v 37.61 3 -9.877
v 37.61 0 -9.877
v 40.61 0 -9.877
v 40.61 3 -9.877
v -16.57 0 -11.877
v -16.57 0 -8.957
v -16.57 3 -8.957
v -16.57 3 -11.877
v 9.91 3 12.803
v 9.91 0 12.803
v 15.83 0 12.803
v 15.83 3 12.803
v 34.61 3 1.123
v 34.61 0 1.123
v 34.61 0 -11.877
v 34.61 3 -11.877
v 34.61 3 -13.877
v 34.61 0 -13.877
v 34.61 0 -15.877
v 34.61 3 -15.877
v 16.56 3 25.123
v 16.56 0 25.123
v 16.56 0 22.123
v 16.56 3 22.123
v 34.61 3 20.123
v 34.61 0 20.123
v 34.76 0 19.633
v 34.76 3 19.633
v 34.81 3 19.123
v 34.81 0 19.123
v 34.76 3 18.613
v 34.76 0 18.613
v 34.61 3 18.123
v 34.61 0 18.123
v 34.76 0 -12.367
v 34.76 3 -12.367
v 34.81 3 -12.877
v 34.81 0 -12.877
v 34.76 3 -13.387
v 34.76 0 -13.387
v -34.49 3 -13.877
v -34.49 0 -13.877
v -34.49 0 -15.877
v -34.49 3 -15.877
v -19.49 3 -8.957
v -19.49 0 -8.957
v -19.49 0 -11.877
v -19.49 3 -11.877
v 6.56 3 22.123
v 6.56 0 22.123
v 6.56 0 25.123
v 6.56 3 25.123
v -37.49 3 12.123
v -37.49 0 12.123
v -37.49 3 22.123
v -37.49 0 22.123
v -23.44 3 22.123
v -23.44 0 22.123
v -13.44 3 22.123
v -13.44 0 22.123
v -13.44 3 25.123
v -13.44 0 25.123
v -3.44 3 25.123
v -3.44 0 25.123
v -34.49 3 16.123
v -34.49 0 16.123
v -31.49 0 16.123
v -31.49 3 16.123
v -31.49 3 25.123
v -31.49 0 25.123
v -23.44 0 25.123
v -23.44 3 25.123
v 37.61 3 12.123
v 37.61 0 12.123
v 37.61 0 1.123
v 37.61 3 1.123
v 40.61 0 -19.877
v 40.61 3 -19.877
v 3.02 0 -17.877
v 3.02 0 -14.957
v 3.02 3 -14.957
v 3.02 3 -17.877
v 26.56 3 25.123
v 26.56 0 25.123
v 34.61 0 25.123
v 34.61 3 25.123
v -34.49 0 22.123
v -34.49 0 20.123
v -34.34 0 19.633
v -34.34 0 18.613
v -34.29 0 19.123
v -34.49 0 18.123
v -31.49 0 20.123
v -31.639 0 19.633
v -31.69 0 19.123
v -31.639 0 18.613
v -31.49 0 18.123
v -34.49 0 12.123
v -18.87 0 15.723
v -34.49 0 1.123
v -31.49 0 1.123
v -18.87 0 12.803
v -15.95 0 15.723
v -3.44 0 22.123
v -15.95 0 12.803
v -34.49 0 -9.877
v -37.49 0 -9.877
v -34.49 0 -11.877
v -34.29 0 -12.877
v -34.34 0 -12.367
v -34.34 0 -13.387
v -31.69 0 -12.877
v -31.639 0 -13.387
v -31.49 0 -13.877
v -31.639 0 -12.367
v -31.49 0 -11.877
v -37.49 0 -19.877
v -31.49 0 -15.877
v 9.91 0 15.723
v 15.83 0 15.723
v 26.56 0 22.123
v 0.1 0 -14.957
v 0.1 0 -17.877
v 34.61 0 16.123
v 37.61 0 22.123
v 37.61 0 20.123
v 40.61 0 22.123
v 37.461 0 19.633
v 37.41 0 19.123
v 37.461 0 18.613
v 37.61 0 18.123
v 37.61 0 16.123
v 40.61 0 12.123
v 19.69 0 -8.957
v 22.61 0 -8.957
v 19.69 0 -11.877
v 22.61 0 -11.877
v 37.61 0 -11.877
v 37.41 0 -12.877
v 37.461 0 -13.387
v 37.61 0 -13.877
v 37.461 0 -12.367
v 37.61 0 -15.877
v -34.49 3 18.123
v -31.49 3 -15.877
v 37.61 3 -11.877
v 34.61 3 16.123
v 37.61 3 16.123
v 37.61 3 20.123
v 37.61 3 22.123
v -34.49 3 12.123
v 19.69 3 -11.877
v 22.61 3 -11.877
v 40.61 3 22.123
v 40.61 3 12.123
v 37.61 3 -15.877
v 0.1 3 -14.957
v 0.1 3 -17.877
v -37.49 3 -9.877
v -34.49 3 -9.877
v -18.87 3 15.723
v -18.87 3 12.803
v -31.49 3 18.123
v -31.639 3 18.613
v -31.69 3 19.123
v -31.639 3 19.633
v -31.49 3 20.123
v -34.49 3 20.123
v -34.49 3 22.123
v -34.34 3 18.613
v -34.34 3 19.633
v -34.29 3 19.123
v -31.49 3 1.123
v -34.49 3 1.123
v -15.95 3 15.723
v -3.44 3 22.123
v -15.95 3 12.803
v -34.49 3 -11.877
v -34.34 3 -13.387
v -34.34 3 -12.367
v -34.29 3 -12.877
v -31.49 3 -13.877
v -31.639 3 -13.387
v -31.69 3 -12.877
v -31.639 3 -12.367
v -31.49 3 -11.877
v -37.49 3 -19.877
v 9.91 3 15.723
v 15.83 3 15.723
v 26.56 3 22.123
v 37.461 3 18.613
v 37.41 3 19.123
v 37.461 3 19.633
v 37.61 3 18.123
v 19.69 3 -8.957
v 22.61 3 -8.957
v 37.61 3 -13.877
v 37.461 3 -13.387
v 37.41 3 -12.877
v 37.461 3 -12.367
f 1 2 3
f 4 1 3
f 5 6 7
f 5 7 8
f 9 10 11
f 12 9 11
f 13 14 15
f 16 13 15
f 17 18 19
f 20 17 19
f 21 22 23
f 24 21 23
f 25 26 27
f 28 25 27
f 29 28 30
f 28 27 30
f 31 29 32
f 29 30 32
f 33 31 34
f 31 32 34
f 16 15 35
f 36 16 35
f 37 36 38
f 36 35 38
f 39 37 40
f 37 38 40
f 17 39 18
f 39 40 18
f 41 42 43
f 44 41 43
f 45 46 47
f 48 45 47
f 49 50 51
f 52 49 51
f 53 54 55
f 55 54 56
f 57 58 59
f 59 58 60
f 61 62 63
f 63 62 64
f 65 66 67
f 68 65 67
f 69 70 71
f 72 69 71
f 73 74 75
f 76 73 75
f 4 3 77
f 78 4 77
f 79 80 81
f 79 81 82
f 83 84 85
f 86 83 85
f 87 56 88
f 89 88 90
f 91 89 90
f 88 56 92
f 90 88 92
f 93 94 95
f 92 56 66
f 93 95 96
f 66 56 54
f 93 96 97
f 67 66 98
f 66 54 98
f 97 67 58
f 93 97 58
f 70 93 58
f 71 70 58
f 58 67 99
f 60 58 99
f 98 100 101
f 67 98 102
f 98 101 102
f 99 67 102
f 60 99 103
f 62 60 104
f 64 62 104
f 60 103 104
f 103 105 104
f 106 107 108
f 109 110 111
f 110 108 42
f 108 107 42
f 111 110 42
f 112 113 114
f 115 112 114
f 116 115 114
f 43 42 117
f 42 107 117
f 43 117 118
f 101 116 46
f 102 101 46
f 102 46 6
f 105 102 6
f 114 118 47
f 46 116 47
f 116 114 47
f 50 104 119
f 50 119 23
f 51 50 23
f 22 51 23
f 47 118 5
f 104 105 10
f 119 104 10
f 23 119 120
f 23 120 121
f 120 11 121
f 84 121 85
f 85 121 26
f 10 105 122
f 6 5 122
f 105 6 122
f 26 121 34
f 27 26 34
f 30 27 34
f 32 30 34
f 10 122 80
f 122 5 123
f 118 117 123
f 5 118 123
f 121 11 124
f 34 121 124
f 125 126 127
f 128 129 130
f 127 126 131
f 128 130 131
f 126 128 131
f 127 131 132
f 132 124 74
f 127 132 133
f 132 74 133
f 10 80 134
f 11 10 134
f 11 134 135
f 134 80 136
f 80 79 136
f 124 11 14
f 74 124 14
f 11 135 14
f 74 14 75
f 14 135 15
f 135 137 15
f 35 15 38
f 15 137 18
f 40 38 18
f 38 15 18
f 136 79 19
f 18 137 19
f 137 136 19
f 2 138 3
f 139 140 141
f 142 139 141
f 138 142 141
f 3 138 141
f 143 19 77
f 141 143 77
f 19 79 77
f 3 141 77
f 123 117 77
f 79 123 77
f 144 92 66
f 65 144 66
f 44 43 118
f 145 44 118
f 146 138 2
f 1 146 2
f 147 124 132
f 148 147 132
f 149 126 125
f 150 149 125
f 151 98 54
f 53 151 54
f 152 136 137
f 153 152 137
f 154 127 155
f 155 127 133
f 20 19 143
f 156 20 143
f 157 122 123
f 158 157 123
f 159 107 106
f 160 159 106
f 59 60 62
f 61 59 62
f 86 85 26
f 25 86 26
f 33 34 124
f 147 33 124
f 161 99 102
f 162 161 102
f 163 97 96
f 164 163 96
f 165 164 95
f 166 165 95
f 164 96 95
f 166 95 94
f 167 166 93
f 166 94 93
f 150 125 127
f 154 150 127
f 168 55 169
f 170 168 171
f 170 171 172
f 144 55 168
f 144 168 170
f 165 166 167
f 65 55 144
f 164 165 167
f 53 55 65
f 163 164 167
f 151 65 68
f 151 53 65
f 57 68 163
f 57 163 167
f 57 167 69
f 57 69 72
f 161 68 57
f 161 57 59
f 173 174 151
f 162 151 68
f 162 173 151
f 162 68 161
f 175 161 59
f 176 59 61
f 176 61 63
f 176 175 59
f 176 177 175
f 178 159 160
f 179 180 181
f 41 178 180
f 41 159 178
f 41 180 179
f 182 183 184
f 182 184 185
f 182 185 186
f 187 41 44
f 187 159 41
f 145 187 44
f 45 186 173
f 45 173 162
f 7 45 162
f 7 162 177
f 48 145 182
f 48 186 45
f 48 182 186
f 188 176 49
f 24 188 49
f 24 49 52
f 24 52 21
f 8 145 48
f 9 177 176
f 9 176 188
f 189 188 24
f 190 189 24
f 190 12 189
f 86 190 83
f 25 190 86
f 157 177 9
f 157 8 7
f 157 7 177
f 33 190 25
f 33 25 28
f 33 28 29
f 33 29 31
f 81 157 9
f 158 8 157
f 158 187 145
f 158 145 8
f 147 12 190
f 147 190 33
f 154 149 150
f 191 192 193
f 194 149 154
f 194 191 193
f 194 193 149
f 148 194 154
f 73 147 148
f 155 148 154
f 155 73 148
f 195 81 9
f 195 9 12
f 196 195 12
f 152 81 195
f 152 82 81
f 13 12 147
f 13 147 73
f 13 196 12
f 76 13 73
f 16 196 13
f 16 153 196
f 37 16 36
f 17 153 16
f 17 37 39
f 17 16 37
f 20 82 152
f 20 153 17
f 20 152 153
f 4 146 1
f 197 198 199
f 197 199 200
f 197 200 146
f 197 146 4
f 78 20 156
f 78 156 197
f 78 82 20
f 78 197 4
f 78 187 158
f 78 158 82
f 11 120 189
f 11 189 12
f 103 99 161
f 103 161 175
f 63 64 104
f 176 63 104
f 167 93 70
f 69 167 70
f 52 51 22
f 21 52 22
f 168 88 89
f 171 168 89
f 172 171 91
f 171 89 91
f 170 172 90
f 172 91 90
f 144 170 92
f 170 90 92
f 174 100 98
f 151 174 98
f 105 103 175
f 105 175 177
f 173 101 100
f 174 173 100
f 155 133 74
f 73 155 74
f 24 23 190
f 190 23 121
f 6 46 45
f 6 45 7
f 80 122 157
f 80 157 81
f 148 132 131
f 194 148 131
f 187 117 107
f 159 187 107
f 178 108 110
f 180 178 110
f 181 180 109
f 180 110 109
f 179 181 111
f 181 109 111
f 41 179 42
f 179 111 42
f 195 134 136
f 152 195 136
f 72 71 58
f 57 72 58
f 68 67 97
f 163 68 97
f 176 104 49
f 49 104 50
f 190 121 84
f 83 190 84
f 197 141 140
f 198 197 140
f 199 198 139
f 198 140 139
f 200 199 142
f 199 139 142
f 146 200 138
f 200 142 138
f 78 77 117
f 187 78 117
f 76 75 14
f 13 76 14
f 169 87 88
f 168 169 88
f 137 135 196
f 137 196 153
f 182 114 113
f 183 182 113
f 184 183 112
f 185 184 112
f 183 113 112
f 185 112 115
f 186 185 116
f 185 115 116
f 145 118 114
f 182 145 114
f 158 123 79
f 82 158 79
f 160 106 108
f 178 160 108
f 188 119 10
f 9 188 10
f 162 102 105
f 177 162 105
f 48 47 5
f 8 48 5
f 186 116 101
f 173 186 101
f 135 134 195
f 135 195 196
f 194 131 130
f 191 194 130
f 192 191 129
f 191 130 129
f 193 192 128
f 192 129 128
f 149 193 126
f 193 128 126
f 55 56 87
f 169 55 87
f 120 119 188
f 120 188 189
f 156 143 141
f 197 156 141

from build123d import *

# Parameters (mm, degrees)
SKETCH1_W           = 2.92
SKETCH1_H           = 2.92
SKETCH1_W_2         = 5.92
BOSS_EXTRUDE1_DEPTH = 3


with BuildPart() as part:
    # Sketch1 → Boss-Extrude1 (new body)
    with BuildSketch(Plane(origin=(0, 0, 0), x_dir=(1, 0, 0), z_dir=(0, 1, 0))):
        with BuildLine():
            Line((-37.489699571, 19.876646482), (-37.489699571, 9.876646482))
            Line((-37.489699571, 9.876646482), (-34.489699571, 9.876646482))
            Line((-34.489699571, 9.876646482), (-34.489699571, 11.876646482))
            ThreePointArc((-34.489699571, 11.876646482), (-34.289699571, 12.876646482), (-34.489699571, 13.876646482))
            Line((-34.489699571, 13.876646482), (-34.489699571, 15.876646482))
            Line((-34.489699571, 15.876646482), (-31.489699571, 15.876646482))
            Line((-31.489699571, 15.876646482), (-31.489699571, 13.876646482))
            ThreePointArc((-31.489699571, 13.876646482), (-31.689699571, 12.876646482), (-31.489699571, 11.876646482))
            Line((-31.489699571, 11.876646482), (-31.489699571, -1.123353518))
            Line((-31.489699571, -1.123353518), (-34.489699571, -1.123353518))
            Line((-34.489699571, -1.123353518), (-34.489699571, -12.123353518))
            Line((-34.489699571, -12.123353518), (-37.489699571, -12.123353518))
            Line((-37.489699571, -12.123353518), (-37.489699571, -22.123353518))
            Line((-37.489699571, -22.123353518), (-34.489699571, -22.123353518))
            Line((-34.489699571, -22.123353518), (-34.489699571, -20.123353518))
            ThreePointArc((-34.489699571, -20.123353518), (-34.289699571, -19.123353518), (-34.489699571, -18.123353518))
            Line((-34.489699571, -18.123353518), (-34.489699571, -16.123353518))
            Line((-34.489699571, -16.123353518), (-31.489699571, -16.123353518))
            Line((-31.489699571, -16.123353518), (-31.489699571, -18.123353518))
            ThreePointArc((-31.489699571, -18.123353518), (-31.689699571, -19.123353518), (-31.489699571, -20.123353518))
            Line((-31.489699571, -20.123353518), (-31.489699571, -25.123353518))
            Line((-31.489699571, -25.123353518), (-23.439699571, -25.123353518))
            Line((-23.439699571, -25.123353518), (-23.439699571, -22.123353518))
            Line((-23.439699571, -22.123353518), (-13.439699571, -22.123353518))
            Line((-13.439699571, -22.123353518), (-13.439699571, -25.123353518))
            Line((-13.439699571, -25.123353518), (-3.439699571, -25.123353518))
            Line((-3.439699571, -25.123353518), (-3.439699571, -22.123353518))
            Line((-3.439699571, -22.123353518), (6.560300429, -22.123353518))
            Line((6.560300429, -22.123353518), (6.560300429, -25.123353518))
            Line((6.560300429, -25.123353518), (16.560300429, -25.123353518))
            Line((16.560300429, -25.123353518), (16.560300429, -22.123353518))
            Line((16.560300429, -22.123353518), (26.560300429, -22.123353518))
            Line((26.560300429, -22.123353518), (26.560300429, -25.123353518))
            Line((26.560300429, -25.123353518), (34.610300429, -25.123353518))
            Line((34.610300429, -25.123353518), (34.610300429, -20.123353518))
            ThreePointArc((34.610300429, -20.123353518), (34.810300429, -19.123353518), (34.610300429, -18.123353518))
            Line((34.610300429, -18.123353518), (34.610300429, -16.123353518))
            Line((34.610300429, -16.123353518), (37.610300429, -16.123353518))
            Line((37.610300429, -16.123353518), (37.610300429, -18.123353518))
            ThreePointArc((37.610300429, -18.123353518), (37.410300429, -19.123353518), (37.610300429, -20.123353518))
            Line((37.610300429, -20.123353518), (37.610300429, -22.123353518))
            Line((37.610300429, -22.123353518), (40.610300429, -22.123353518))
            Line((40.610300429, -22.123353518), (40.610300429, -12.123353518))
            Line((40.610300429, -12.123353518), (37.610300429, -12.123353518))
            Line((37.610300429, -12.123353518), (37.610300429, -1.123353518))
            Line((37.610300429, -1.123353518), (34.610300429, -1.123353518))
            Line((34.610300429, -1.123353518), (34.610300429, 11.876646482))
            ThreePointArc((34.610300429, 11.876646482), (34.810300429, 12.876646482), (34.610300429, 13.876646482))
            Line((34.610300429, 13.876646482), (34.610300429, 15.876646482))
            Line((34.610300429, 15.876646482), (37.610300429, 15.876646482))
            Line((37.610300429, 15.876646482), (37.610300429, 13.876646482))
            ThreePointArc((37.610300429, 13.876646482), (37.410300429, 12.876646482), (37.610300429, 11.876646482))
            Line((37.610300429, 11.876646482), (37.610300429, 9.876646482))
            Line((37.610300429, 9.876646482), (40.610300429, 9.876646482))
            Line((40.610300429, 9.876646482), (40.610300429, 19.876646482))
            Line((40.610300429, 19.876646482), (-37.489699571, 19.876646482))
        make_face()
        with Locations((1.560300429, 16.416646482)):
            Rectangle(SKETCH1_W, SKETCH1_H, mode=Mode.SUBTRACT)
        with Locations((12.870300429, -14.263353518)):
            Rectangle(SKETCH1_W_2, SKETCH1_H, mode=Mode.SUBTRACT)
        with Locations((21.150300429, 10.416646482)):
            Rectangle(SKETCH1_W, SKETCH1_H, mode=Mode.SUBTRACT)
        with Locations((-18.029699571, 10.416646482)):
            Rectangle(SKETCH1_W, SKETCH1_H, mode=Mode.SUBTRACT)
        with Locations((-17.409699571, -14.263353518)):
            Rectangle(SKETCH1_W, SKETCH1_H, mode=Mode.SUBTRACT)
    extrude(amount=BOSS_EXTRUDE1_DEPTH)


solid = part.part
